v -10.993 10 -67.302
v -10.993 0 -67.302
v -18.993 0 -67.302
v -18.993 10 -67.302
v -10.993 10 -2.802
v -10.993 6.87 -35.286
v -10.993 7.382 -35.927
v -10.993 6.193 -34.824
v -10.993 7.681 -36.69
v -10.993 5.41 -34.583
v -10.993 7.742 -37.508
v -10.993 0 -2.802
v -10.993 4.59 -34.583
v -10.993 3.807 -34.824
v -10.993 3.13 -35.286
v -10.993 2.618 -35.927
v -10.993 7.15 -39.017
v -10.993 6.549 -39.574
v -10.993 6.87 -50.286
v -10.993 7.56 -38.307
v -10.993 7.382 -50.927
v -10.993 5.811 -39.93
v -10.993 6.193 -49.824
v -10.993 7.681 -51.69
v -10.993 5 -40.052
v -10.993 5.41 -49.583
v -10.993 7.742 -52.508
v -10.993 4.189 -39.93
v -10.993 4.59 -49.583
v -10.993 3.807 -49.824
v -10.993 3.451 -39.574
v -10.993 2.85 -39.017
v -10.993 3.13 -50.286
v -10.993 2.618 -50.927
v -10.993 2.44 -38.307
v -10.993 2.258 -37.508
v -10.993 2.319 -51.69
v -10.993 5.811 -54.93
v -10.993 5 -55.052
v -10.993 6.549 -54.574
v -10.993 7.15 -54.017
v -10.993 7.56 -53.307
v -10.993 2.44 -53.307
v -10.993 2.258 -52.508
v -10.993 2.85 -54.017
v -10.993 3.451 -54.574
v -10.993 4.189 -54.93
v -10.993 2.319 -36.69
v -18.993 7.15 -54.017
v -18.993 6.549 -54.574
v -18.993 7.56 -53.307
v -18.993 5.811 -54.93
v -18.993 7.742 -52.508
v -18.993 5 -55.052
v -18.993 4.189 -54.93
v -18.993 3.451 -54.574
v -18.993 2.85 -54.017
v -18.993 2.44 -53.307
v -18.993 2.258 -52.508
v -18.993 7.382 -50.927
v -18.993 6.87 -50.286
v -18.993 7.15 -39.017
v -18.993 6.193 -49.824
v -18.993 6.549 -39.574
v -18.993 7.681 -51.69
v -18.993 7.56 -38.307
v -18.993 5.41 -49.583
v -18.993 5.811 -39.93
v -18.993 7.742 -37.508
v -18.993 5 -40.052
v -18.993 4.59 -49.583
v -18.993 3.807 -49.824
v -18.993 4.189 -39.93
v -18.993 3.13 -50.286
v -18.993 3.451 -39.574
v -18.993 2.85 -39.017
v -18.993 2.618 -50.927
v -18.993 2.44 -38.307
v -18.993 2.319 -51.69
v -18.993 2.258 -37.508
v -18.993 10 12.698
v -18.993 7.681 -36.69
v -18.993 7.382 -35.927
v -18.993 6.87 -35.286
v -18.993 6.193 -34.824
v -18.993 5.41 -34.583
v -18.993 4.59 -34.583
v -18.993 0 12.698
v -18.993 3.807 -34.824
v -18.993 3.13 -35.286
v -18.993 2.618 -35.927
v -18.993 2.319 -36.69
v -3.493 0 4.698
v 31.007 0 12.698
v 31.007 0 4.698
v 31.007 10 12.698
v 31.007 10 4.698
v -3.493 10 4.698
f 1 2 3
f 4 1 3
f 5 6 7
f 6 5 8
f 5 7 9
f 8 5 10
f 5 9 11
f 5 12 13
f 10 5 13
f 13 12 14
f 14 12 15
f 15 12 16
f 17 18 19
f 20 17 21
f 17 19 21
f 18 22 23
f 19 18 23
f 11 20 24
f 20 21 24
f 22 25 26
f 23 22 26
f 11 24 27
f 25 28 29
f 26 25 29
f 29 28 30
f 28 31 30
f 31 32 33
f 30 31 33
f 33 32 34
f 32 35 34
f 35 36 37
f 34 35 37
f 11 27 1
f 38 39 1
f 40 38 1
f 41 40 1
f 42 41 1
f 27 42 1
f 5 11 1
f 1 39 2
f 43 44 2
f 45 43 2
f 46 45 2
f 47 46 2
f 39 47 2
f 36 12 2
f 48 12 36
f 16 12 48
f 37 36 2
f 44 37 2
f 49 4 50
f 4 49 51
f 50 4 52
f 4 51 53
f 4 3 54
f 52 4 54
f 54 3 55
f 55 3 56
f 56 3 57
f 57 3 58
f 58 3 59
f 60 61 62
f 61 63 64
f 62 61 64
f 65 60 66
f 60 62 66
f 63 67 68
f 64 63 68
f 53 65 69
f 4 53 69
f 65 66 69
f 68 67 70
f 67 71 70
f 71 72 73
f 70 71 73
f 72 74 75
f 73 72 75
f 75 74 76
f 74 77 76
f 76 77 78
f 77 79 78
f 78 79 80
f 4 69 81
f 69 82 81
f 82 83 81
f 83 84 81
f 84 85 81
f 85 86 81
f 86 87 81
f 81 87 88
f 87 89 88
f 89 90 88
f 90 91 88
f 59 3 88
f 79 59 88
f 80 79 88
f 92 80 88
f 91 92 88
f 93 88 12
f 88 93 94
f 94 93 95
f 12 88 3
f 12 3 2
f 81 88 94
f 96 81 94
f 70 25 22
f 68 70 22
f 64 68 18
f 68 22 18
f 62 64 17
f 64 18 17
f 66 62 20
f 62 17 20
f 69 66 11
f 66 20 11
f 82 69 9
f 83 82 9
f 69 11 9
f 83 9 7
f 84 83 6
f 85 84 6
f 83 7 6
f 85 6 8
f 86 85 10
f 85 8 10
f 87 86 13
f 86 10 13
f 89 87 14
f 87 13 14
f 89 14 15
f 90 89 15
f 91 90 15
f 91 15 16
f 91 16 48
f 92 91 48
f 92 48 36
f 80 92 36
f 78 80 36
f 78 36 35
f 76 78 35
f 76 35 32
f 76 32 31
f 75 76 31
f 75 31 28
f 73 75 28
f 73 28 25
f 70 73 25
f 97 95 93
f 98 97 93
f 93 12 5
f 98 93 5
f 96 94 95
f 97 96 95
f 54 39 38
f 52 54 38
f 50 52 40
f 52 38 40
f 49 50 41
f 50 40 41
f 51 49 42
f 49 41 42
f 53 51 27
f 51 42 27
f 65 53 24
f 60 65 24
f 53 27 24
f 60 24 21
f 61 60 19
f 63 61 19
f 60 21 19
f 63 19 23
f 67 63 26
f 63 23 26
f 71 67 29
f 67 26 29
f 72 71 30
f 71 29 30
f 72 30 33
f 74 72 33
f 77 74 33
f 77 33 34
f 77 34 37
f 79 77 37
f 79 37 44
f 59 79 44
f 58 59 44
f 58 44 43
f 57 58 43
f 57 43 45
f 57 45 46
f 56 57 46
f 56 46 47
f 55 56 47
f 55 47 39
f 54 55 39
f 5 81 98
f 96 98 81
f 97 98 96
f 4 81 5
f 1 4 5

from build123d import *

# Parameters (mm, degrees)
EXTRUDE_1_DEPTH     = 10
CHAMFER_1_SIZE      = 7.5
SKETCH_2_R          = 2.75
CUT_EXTRUDE_1_DEPTH = 80.959868111


with BuildPart() as part:
    # 草图1 → 凸台-拉伸1 (new body)
    with BuildSketch(Plane(origin=(0, 0, 0), x_dir=(1, 0, 0), z_dir=(0, 1, 0))):
        Polygon((-10.992805755, 67.302158273), (-18.992805755, 67.302158273), (-18.992805755, -4.697841727), (-18.992805755, -12.697841727), (-10.992805755, -12.697841727), (31.007194245, -12.697841727), (31.007194245, -4.697841727), (-10.992805755, -4.697841727), align=None)
    extrude(amount=EXTRUDE_1_DEPTH)

    # 倒角1
    chamfer_1_edges = [part.edges().sort_by_distance(p)[0] for p in [
        (-10.992805755, 5, 4.697841727),
    ]]
    chamfer(chamfer_1_edges, length=CHAMFER_1_SIZE)

    # 草图2 → 切除-拉伸1 (cut, through all)
    with BuildSketch(Plane(origin=(-10.992805755, 0, 0), x_dir=(0, 0, -1), z_dir=(1, 0, 0))):
        with Locations((37.302158273, 5)):
            Circle(SKETCH_2_R)
        with Locations((52.302158273, 5)):
            Circle(SKETCH_2_R)
    extrude(amount=-CUT_EXTRUDE_1_DEPTH, mode=Mode.SUBTRACT)


solid = part.part
